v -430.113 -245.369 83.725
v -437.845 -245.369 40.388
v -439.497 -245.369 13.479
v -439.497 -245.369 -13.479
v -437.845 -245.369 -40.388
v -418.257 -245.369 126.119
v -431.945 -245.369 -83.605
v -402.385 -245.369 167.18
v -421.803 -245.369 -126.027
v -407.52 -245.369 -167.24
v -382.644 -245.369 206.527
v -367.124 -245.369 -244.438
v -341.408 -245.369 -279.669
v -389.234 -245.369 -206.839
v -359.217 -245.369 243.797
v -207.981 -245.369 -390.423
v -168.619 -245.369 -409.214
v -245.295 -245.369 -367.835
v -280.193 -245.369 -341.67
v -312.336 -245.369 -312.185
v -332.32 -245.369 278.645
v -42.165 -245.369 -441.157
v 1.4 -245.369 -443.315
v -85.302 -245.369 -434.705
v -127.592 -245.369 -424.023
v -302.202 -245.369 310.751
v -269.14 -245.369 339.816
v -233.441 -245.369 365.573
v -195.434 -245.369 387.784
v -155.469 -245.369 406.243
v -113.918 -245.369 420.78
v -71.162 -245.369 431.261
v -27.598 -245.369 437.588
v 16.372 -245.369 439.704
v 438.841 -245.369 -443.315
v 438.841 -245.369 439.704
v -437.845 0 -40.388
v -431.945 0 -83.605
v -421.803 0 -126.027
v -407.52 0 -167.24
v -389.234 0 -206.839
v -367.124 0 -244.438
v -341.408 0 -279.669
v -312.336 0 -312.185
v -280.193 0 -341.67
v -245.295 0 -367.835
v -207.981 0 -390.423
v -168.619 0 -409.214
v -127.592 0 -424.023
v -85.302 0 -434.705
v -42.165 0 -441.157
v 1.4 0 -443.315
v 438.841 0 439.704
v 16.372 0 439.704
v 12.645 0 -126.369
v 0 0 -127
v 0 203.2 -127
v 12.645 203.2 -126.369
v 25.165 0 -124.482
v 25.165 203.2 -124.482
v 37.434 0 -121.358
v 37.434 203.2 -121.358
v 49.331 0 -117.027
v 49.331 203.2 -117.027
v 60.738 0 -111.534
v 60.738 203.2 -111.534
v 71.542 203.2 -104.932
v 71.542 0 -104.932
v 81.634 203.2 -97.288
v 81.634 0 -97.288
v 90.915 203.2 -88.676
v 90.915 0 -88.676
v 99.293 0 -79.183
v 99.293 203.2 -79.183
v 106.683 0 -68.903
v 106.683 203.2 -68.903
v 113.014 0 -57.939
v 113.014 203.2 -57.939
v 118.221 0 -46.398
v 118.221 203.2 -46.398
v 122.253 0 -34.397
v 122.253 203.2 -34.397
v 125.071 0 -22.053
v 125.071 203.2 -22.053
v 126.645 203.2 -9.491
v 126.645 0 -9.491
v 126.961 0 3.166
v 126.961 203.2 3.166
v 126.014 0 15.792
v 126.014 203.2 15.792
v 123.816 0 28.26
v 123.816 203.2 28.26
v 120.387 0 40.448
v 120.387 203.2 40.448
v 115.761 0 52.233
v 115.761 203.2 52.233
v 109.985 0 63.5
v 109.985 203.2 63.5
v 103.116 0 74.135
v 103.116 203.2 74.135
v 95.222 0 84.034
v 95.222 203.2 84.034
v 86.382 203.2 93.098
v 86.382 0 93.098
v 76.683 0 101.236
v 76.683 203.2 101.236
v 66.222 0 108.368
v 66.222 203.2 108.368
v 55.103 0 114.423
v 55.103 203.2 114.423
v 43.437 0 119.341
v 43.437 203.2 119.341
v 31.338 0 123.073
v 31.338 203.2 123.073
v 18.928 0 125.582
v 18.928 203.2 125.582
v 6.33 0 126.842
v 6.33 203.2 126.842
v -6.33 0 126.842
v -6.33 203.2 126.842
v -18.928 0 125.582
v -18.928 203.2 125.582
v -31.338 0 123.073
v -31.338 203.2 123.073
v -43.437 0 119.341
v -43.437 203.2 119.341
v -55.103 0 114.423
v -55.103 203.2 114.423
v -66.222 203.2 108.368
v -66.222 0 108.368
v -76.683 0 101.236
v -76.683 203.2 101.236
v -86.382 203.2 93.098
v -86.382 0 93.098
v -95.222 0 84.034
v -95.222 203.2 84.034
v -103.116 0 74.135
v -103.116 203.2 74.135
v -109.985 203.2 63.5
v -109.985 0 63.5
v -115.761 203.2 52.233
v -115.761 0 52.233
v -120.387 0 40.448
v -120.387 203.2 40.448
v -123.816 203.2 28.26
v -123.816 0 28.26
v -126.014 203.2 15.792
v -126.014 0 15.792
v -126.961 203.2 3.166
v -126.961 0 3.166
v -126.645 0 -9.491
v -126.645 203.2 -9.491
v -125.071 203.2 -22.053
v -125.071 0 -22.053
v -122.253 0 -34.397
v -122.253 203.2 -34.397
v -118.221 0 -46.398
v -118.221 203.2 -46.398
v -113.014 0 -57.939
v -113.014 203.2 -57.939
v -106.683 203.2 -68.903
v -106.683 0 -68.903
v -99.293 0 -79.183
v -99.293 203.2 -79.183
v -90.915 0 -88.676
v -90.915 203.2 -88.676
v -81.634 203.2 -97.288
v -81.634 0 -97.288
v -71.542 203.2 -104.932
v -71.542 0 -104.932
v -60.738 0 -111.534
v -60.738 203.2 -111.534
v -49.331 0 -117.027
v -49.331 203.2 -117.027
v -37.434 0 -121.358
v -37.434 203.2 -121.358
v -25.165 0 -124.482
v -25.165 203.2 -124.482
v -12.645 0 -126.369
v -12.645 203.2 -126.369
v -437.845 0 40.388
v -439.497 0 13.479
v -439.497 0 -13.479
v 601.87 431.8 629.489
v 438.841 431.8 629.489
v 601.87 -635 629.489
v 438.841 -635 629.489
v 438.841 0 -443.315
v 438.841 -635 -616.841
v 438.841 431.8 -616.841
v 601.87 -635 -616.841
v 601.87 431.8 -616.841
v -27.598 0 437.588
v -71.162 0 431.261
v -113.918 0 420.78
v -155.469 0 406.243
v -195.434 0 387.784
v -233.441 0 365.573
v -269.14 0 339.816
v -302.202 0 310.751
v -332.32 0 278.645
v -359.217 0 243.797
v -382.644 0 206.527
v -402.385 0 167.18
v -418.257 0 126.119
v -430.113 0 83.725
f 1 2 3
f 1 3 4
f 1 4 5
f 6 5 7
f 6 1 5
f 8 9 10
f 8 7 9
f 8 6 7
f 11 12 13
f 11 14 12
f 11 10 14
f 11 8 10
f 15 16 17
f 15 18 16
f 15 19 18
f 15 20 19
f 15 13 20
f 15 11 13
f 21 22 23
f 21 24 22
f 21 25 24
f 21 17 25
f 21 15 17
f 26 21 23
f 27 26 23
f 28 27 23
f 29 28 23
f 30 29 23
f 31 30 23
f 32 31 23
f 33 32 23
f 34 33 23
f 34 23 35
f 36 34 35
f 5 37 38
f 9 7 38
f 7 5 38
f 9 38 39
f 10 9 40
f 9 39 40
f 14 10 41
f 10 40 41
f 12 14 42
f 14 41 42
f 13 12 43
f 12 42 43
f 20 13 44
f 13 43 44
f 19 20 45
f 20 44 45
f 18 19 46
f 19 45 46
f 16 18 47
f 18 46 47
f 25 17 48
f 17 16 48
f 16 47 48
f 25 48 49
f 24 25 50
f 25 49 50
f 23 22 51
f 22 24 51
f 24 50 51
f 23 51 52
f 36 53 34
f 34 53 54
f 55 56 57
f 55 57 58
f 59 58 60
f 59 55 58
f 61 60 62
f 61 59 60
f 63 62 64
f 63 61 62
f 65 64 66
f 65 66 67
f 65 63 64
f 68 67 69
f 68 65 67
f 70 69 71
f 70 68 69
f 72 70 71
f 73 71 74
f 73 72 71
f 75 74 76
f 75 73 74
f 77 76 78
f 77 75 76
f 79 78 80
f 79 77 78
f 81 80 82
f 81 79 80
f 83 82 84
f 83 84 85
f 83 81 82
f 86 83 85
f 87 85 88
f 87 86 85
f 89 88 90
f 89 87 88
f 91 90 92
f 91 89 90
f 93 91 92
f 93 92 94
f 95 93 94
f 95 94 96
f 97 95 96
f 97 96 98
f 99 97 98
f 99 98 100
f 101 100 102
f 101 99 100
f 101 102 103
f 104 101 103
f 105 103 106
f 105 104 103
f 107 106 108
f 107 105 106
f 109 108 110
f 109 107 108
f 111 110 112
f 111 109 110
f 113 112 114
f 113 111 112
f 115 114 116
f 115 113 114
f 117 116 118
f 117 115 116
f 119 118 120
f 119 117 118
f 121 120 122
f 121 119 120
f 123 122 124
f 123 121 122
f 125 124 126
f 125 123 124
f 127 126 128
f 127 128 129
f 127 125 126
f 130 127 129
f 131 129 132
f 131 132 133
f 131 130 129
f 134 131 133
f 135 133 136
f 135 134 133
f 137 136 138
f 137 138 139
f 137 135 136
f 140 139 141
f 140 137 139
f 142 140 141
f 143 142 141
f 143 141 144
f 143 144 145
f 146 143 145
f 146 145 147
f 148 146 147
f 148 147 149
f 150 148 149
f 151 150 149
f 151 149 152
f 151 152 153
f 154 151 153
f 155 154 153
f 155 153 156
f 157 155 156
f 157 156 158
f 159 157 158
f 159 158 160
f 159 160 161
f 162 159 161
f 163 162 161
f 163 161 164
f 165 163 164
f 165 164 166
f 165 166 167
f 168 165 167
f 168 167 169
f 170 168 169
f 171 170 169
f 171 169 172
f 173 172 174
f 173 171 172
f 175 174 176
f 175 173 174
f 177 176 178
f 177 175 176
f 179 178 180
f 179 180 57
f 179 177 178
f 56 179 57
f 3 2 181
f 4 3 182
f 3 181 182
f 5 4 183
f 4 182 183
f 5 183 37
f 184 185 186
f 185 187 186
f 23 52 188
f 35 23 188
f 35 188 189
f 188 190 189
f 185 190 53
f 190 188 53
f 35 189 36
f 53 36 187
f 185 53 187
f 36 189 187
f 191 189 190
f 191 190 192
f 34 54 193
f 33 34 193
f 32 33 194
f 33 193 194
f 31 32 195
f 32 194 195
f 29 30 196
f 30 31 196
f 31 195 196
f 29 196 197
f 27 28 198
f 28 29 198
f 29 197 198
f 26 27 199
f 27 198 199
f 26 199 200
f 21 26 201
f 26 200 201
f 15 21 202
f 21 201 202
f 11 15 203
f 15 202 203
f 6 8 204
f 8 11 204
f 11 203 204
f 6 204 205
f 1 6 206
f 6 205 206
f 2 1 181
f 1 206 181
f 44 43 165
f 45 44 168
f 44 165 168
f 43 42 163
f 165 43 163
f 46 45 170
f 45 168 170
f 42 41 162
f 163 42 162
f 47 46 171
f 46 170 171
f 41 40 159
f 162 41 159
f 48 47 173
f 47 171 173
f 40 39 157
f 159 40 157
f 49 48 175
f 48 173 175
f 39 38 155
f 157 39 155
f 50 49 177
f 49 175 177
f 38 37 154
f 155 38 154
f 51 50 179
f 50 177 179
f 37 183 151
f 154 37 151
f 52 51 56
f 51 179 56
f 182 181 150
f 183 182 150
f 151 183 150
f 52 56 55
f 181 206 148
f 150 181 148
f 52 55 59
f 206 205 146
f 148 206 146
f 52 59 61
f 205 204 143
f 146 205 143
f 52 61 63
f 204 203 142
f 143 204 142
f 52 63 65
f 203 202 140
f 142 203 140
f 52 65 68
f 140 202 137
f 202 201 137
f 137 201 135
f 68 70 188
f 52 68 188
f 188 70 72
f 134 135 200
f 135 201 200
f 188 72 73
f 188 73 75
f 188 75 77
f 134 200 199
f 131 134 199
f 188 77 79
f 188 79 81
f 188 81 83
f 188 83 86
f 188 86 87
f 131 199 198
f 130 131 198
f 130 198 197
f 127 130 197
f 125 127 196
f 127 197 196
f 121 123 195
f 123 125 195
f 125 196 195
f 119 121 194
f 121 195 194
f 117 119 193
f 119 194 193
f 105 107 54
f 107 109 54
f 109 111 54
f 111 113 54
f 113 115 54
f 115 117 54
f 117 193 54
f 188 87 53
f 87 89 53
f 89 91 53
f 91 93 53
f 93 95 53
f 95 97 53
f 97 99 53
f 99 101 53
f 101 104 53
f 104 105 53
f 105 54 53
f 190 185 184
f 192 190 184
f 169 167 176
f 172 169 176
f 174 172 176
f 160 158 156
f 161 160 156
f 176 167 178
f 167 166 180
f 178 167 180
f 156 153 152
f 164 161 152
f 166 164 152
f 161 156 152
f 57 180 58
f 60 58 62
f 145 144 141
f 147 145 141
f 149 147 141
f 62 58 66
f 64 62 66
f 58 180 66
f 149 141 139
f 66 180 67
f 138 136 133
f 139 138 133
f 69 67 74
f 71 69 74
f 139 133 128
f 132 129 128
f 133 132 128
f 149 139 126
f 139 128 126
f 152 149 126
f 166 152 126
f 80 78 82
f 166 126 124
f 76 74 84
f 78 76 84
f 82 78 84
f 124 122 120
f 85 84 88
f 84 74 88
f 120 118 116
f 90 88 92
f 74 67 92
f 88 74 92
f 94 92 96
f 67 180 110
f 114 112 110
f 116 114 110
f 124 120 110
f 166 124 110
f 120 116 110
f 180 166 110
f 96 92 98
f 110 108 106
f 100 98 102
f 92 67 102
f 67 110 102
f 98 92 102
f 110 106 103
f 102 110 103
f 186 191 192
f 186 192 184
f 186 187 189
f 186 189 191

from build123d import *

# Parameters (mm, degrees)
F1_DEPTH    = 245.36945
F2_DEPTH    = 203.2
F3_W        = 163.0290746689
F3_H        = 1246.3291883469
F4_DEPTH    = 635
F5_DEPTH    = 431.8
F6_T1_DEPTH = 2516.4554829813
F7_T1_DEPTH = 2441.5924956103


# Not quite as in the source:
# - a fillet or chamfer that OpenCascade refuses, or shapes differently, is made with other operations: its cross-section is extruded or revolved along the edge and cut away or added


with BuildPart() as f1:
    # F0 (on Front) → F1 (new body)
    with BuildSketch(Plane.XZ):
        with BuildLine():
            Line((-437.8447532654, -40.3878050825), (-437.8447532654, 40.3878050825))
            ThreePointArc((-437.8447532654, 40.3878050825), (-439.703539628, 0), (-437.8447532654, -40.3878050825))
        make_face()
        with BuildLine():
            Line((-437.8447532654, 439.703539628), (-437.8447532654, 40.3878050825))
            Line((-437.8447532654, 40.3878050825), (-437.8447532654, -40.3878050825))
            Line((-437.8447532654, -40.3878050825), (-437.8447532654, -443.3148503304))
            Line((-437.8447532654, -443.3148503304), (0, -443.3148503304))
            Line((0, -443.3148503304), (0, -127))
            ThreePointArc((0, -127), (-127, 0), (0, 127))
            Line((0, 127), (0, 439.703539628))
            Line((0, 439.703539628), (-437.8447532654, 439.703539628))
        make_face()
        with BuildLine():
            Line((440.1807188988, 439.703539628), (0, 439.703539628))
            Line((0, 439.703539628), (0, 127))
            ThreePointArc((0, 127), (89.8025612107, 89.8025612107), (127, 0))
            ThreePointArc((127, 0), (89.8025612107, -89.8025612107), (0, -127))
            Line((0, -127), (0, -443.3148503304))
            Line((0, -443.3148503304), (440.1807188988, -443.3148503304))
            Line((440.1807188988, -443.3148503304), (440.1807188988, 439.703539628))
        make_face()
        with BuildLine():
            Line((0, -127), (0, 127))
            ThreePointArc((0, 127), (-127, 0), (0, -127))
        make_face()
        with BuildLine():
            ThreePointArc((127, 0), (89.8025612107, 89.8025612107), (0, 127))
            Line((0, 127), (0, -127))
            ThreePointArc((0, -127), (89.8025612107, -89.8025612107), (127, 0))
        make_face()
    extrude(amount=F1_DEPTH)

    # F0 (on Front) → F2 (join)
    with BuildSketch(Plane.XZ):
        with BuildLine():
            Line((0, -127), (0, 127))
            ThreePointArc((0, 127), (-127, 0), (0, -127))
        make_face()
        with BuildLine():
            ThreePointArc((127, 0), (89.8025612107, 89.8025612107), (0, 127))
            Line((0, 127), (0, -127))
            ThreePointArc((0, -127), (89.8025612107, -89.8025612107), (127, 0))
        make_face()
    extrude(amount=-F2_DEPTH)

    # F3 (on Front) → F4 (join)
    with BuildSketch(Plane.XZ):
        with Locations((520.3551054001, 6.3239336014)):
            Rectangle(F3_W, F3_H)
    extrude(amount=F4_DEPTH)

    # F3 (on Front) → F5 (join)
    with BuildSketch(Plane.XZ):
        with Locations((520.3551054001, 6.3239336014)):
            Rectangle(F3_W, F3_H)
    extrude(amount=-F5_DEPTH)

    # F6: fillet of radius 457.9913774748 on 1 edges, made by hand

    # F6_s2 → F6_t1 (cut)
    with BuildSketch(Plane.XZ.offset(-1135.5430164906)):
        with BuildLine():
            ThreePointArc((16.3724533309, 439.703539628), (-286.0206379525, 325.6809400755), (-437.8447532654, 40.3878050825))
            Line((-437.8447532654, 40.3878050825), (-437.8447532654, 439.703539628))
            Line((-437.8447532654, 439.703539628), (16.3724533309, 439.703539628))
        make_face()
    extrude(amount=F6_T1_DEPTH, mode=Mode.SUBTRACT)

    # F7: fillet of radius 440.8813389734 on 1 edges, made by hand

    # F7_s2 → F7_t1 (cut)
    with BuildSketch(Plane.XZ.offset(-1098.1115228051)):
        with BuildLine():
            ThreePointArc((-437.8447532654, -40.3878050825), (-296.6295178781, -327.3255664249), (1.3998558567, -443.3148503304))
            Line((1.3998558567, -443.3148503304), (-437.8447532654, -443.3148503304))
            Line((-437.8447532654, -443.3148503304), (-437.8447532654, -40.3878050825))
        make_face()
    extrude(amount=F7_T1_DEPTH, mode=Mode.SUBTRACT)


solid = f1.part
